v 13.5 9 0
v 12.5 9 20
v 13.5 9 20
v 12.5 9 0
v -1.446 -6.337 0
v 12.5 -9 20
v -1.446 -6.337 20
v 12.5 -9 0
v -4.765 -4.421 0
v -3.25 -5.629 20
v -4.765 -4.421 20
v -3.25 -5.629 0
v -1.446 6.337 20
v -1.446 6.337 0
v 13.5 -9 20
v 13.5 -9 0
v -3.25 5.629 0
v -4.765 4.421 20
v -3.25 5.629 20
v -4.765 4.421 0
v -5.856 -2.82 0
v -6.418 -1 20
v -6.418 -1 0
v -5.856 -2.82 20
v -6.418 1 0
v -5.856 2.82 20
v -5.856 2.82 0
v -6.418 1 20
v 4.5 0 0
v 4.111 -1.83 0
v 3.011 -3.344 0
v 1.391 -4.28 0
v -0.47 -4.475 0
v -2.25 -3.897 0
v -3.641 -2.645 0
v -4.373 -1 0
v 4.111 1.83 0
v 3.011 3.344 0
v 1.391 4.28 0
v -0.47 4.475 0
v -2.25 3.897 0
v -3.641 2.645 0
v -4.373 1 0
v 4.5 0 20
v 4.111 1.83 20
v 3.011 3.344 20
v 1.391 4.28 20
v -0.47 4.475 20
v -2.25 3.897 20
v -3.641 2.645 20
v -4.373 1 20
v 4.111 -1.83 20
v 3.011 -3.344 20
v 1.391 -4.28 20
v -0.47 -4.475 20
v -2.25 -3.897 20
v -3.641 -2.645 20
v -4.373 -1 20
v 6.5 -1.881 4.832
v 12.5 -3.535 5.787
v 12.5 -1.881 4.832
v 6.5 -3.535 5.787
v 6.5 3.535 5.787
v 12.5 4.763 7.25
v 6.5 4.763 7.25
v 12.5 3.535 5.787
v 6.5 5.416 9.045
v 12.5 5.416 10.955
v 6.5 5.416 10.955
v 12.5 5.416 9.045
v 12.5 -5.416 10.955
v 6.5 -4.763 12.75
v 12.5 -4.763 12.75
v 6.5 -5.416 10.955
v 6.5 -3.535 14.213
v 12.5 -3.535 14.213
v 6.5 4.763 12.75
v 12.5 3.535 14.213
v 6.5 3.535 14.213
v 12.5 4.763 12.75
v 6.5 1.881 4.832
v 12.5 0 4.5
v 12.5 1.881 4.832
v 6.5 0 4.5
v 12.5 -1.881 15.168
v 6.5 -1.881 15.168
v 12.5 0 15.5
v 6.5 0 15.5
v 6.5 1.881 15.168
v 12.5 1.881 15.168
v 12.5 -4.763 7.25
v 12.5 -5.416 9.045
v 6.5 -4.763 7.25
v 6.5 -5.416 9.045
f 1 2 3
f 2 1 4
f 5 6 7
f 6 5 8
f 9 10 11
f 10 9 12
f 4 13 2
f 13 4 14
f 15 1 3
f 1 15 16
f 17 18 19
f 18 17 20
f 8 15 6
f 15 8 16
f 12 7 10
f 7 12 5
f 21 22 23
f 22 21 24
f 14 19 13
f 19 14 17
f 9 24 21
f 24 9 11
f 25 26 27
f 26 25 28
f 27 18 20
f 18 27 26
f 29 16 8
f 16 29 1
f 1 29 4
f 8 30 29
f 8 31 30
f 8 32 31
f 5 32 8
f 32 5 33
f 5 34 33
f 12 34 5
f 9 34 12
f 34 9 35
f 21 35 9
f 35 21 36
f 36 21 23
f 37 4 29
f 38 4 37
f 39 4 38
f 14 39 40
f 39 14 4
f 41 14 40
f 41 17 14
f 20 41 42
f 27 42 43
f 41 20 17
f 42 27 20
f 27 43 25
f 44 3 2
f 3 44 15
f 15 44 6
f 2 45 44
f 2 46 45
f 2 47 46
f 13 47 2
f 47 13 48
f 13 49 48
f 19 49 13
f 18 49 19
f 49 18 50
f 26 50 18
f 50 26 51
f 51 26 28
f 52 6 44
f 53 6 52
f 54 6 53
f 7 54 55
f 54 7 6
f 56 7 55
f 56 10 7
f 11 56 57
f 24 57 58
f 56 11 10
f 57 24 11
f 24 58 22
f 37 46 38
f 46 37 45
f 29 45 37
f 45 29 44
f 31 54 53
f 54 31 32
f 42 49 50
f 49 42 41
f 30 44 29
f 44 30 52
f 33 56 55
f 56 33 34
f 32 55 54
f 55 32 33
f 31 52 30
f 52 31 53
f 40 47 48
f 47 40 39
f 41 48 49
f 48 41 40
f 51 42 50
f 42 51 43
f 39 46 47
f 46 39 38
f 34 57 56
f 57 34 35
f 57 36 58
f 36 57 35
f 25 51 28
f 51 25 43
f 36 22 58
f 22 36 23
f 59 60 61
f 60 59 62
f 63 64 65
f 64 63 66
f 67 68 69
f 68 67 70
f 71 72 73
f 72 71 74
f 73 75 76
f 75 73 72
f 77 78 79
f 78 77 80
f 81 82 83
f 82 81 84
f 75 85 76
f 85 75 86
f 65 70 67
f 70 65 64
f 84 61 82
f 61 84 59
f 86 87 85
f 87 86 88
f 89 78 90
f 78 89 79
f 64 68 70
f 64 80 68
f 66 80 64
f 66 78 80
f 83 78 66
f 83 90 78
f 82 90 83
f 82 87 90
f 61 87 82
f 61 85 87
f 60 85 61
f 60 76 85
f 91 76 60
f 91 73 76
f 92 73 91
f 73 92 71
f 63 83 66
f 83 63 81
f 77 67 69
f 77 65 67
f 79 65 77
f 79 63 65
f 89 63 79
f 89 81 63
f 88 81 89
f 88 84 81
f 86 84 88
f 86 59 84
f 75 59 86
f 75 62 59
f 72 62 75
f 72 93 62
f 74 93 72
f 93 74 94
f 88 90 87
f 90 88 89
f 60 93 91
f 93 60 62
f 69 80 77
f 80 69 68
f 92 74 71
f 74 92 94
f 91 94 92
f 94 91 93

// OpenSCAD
/* https://help.prusa3d.com/article/insert-pause-or-custom-g-code-at-layer_120490#insert-pause-at-layer */

/* all in mm */
H = 20; /* height */
PD = 9; /* pen diameter */
WT = 2; /* wall thickness */
BW = 18; /* base width */
BT = 1; /* base thickness */
MT = 5 + 1; /* magnet thickness */
MD = 10 + 1; /* magnet diameter */
WTUM = 1; /* wall thickness under magnet */
SW = 2; /* slit width */

CD = PD + 2*WT; /* cylinder diameter */
CT = MT + WTUM; /* cube thickness */

difference() {
    hull() {
        cylinder(d=CD, h=H);
        translate([CD/2+MT+WTUM-BT, -BW/2, 0]) cube([BT, BW, H]);
    }
    /* pen hole: */
    cylinder(d=PD, h=H);
    /* slit: */
    translate([-CD/2-WT/2, -SW/2, 0]) cube([2*WT, SW, H]);
    /* magnet cavity: */
    translate([CD/2, 0, H/2]) rotate([0, 90, 0]) cylinder(d=MD, h=MT);
}
